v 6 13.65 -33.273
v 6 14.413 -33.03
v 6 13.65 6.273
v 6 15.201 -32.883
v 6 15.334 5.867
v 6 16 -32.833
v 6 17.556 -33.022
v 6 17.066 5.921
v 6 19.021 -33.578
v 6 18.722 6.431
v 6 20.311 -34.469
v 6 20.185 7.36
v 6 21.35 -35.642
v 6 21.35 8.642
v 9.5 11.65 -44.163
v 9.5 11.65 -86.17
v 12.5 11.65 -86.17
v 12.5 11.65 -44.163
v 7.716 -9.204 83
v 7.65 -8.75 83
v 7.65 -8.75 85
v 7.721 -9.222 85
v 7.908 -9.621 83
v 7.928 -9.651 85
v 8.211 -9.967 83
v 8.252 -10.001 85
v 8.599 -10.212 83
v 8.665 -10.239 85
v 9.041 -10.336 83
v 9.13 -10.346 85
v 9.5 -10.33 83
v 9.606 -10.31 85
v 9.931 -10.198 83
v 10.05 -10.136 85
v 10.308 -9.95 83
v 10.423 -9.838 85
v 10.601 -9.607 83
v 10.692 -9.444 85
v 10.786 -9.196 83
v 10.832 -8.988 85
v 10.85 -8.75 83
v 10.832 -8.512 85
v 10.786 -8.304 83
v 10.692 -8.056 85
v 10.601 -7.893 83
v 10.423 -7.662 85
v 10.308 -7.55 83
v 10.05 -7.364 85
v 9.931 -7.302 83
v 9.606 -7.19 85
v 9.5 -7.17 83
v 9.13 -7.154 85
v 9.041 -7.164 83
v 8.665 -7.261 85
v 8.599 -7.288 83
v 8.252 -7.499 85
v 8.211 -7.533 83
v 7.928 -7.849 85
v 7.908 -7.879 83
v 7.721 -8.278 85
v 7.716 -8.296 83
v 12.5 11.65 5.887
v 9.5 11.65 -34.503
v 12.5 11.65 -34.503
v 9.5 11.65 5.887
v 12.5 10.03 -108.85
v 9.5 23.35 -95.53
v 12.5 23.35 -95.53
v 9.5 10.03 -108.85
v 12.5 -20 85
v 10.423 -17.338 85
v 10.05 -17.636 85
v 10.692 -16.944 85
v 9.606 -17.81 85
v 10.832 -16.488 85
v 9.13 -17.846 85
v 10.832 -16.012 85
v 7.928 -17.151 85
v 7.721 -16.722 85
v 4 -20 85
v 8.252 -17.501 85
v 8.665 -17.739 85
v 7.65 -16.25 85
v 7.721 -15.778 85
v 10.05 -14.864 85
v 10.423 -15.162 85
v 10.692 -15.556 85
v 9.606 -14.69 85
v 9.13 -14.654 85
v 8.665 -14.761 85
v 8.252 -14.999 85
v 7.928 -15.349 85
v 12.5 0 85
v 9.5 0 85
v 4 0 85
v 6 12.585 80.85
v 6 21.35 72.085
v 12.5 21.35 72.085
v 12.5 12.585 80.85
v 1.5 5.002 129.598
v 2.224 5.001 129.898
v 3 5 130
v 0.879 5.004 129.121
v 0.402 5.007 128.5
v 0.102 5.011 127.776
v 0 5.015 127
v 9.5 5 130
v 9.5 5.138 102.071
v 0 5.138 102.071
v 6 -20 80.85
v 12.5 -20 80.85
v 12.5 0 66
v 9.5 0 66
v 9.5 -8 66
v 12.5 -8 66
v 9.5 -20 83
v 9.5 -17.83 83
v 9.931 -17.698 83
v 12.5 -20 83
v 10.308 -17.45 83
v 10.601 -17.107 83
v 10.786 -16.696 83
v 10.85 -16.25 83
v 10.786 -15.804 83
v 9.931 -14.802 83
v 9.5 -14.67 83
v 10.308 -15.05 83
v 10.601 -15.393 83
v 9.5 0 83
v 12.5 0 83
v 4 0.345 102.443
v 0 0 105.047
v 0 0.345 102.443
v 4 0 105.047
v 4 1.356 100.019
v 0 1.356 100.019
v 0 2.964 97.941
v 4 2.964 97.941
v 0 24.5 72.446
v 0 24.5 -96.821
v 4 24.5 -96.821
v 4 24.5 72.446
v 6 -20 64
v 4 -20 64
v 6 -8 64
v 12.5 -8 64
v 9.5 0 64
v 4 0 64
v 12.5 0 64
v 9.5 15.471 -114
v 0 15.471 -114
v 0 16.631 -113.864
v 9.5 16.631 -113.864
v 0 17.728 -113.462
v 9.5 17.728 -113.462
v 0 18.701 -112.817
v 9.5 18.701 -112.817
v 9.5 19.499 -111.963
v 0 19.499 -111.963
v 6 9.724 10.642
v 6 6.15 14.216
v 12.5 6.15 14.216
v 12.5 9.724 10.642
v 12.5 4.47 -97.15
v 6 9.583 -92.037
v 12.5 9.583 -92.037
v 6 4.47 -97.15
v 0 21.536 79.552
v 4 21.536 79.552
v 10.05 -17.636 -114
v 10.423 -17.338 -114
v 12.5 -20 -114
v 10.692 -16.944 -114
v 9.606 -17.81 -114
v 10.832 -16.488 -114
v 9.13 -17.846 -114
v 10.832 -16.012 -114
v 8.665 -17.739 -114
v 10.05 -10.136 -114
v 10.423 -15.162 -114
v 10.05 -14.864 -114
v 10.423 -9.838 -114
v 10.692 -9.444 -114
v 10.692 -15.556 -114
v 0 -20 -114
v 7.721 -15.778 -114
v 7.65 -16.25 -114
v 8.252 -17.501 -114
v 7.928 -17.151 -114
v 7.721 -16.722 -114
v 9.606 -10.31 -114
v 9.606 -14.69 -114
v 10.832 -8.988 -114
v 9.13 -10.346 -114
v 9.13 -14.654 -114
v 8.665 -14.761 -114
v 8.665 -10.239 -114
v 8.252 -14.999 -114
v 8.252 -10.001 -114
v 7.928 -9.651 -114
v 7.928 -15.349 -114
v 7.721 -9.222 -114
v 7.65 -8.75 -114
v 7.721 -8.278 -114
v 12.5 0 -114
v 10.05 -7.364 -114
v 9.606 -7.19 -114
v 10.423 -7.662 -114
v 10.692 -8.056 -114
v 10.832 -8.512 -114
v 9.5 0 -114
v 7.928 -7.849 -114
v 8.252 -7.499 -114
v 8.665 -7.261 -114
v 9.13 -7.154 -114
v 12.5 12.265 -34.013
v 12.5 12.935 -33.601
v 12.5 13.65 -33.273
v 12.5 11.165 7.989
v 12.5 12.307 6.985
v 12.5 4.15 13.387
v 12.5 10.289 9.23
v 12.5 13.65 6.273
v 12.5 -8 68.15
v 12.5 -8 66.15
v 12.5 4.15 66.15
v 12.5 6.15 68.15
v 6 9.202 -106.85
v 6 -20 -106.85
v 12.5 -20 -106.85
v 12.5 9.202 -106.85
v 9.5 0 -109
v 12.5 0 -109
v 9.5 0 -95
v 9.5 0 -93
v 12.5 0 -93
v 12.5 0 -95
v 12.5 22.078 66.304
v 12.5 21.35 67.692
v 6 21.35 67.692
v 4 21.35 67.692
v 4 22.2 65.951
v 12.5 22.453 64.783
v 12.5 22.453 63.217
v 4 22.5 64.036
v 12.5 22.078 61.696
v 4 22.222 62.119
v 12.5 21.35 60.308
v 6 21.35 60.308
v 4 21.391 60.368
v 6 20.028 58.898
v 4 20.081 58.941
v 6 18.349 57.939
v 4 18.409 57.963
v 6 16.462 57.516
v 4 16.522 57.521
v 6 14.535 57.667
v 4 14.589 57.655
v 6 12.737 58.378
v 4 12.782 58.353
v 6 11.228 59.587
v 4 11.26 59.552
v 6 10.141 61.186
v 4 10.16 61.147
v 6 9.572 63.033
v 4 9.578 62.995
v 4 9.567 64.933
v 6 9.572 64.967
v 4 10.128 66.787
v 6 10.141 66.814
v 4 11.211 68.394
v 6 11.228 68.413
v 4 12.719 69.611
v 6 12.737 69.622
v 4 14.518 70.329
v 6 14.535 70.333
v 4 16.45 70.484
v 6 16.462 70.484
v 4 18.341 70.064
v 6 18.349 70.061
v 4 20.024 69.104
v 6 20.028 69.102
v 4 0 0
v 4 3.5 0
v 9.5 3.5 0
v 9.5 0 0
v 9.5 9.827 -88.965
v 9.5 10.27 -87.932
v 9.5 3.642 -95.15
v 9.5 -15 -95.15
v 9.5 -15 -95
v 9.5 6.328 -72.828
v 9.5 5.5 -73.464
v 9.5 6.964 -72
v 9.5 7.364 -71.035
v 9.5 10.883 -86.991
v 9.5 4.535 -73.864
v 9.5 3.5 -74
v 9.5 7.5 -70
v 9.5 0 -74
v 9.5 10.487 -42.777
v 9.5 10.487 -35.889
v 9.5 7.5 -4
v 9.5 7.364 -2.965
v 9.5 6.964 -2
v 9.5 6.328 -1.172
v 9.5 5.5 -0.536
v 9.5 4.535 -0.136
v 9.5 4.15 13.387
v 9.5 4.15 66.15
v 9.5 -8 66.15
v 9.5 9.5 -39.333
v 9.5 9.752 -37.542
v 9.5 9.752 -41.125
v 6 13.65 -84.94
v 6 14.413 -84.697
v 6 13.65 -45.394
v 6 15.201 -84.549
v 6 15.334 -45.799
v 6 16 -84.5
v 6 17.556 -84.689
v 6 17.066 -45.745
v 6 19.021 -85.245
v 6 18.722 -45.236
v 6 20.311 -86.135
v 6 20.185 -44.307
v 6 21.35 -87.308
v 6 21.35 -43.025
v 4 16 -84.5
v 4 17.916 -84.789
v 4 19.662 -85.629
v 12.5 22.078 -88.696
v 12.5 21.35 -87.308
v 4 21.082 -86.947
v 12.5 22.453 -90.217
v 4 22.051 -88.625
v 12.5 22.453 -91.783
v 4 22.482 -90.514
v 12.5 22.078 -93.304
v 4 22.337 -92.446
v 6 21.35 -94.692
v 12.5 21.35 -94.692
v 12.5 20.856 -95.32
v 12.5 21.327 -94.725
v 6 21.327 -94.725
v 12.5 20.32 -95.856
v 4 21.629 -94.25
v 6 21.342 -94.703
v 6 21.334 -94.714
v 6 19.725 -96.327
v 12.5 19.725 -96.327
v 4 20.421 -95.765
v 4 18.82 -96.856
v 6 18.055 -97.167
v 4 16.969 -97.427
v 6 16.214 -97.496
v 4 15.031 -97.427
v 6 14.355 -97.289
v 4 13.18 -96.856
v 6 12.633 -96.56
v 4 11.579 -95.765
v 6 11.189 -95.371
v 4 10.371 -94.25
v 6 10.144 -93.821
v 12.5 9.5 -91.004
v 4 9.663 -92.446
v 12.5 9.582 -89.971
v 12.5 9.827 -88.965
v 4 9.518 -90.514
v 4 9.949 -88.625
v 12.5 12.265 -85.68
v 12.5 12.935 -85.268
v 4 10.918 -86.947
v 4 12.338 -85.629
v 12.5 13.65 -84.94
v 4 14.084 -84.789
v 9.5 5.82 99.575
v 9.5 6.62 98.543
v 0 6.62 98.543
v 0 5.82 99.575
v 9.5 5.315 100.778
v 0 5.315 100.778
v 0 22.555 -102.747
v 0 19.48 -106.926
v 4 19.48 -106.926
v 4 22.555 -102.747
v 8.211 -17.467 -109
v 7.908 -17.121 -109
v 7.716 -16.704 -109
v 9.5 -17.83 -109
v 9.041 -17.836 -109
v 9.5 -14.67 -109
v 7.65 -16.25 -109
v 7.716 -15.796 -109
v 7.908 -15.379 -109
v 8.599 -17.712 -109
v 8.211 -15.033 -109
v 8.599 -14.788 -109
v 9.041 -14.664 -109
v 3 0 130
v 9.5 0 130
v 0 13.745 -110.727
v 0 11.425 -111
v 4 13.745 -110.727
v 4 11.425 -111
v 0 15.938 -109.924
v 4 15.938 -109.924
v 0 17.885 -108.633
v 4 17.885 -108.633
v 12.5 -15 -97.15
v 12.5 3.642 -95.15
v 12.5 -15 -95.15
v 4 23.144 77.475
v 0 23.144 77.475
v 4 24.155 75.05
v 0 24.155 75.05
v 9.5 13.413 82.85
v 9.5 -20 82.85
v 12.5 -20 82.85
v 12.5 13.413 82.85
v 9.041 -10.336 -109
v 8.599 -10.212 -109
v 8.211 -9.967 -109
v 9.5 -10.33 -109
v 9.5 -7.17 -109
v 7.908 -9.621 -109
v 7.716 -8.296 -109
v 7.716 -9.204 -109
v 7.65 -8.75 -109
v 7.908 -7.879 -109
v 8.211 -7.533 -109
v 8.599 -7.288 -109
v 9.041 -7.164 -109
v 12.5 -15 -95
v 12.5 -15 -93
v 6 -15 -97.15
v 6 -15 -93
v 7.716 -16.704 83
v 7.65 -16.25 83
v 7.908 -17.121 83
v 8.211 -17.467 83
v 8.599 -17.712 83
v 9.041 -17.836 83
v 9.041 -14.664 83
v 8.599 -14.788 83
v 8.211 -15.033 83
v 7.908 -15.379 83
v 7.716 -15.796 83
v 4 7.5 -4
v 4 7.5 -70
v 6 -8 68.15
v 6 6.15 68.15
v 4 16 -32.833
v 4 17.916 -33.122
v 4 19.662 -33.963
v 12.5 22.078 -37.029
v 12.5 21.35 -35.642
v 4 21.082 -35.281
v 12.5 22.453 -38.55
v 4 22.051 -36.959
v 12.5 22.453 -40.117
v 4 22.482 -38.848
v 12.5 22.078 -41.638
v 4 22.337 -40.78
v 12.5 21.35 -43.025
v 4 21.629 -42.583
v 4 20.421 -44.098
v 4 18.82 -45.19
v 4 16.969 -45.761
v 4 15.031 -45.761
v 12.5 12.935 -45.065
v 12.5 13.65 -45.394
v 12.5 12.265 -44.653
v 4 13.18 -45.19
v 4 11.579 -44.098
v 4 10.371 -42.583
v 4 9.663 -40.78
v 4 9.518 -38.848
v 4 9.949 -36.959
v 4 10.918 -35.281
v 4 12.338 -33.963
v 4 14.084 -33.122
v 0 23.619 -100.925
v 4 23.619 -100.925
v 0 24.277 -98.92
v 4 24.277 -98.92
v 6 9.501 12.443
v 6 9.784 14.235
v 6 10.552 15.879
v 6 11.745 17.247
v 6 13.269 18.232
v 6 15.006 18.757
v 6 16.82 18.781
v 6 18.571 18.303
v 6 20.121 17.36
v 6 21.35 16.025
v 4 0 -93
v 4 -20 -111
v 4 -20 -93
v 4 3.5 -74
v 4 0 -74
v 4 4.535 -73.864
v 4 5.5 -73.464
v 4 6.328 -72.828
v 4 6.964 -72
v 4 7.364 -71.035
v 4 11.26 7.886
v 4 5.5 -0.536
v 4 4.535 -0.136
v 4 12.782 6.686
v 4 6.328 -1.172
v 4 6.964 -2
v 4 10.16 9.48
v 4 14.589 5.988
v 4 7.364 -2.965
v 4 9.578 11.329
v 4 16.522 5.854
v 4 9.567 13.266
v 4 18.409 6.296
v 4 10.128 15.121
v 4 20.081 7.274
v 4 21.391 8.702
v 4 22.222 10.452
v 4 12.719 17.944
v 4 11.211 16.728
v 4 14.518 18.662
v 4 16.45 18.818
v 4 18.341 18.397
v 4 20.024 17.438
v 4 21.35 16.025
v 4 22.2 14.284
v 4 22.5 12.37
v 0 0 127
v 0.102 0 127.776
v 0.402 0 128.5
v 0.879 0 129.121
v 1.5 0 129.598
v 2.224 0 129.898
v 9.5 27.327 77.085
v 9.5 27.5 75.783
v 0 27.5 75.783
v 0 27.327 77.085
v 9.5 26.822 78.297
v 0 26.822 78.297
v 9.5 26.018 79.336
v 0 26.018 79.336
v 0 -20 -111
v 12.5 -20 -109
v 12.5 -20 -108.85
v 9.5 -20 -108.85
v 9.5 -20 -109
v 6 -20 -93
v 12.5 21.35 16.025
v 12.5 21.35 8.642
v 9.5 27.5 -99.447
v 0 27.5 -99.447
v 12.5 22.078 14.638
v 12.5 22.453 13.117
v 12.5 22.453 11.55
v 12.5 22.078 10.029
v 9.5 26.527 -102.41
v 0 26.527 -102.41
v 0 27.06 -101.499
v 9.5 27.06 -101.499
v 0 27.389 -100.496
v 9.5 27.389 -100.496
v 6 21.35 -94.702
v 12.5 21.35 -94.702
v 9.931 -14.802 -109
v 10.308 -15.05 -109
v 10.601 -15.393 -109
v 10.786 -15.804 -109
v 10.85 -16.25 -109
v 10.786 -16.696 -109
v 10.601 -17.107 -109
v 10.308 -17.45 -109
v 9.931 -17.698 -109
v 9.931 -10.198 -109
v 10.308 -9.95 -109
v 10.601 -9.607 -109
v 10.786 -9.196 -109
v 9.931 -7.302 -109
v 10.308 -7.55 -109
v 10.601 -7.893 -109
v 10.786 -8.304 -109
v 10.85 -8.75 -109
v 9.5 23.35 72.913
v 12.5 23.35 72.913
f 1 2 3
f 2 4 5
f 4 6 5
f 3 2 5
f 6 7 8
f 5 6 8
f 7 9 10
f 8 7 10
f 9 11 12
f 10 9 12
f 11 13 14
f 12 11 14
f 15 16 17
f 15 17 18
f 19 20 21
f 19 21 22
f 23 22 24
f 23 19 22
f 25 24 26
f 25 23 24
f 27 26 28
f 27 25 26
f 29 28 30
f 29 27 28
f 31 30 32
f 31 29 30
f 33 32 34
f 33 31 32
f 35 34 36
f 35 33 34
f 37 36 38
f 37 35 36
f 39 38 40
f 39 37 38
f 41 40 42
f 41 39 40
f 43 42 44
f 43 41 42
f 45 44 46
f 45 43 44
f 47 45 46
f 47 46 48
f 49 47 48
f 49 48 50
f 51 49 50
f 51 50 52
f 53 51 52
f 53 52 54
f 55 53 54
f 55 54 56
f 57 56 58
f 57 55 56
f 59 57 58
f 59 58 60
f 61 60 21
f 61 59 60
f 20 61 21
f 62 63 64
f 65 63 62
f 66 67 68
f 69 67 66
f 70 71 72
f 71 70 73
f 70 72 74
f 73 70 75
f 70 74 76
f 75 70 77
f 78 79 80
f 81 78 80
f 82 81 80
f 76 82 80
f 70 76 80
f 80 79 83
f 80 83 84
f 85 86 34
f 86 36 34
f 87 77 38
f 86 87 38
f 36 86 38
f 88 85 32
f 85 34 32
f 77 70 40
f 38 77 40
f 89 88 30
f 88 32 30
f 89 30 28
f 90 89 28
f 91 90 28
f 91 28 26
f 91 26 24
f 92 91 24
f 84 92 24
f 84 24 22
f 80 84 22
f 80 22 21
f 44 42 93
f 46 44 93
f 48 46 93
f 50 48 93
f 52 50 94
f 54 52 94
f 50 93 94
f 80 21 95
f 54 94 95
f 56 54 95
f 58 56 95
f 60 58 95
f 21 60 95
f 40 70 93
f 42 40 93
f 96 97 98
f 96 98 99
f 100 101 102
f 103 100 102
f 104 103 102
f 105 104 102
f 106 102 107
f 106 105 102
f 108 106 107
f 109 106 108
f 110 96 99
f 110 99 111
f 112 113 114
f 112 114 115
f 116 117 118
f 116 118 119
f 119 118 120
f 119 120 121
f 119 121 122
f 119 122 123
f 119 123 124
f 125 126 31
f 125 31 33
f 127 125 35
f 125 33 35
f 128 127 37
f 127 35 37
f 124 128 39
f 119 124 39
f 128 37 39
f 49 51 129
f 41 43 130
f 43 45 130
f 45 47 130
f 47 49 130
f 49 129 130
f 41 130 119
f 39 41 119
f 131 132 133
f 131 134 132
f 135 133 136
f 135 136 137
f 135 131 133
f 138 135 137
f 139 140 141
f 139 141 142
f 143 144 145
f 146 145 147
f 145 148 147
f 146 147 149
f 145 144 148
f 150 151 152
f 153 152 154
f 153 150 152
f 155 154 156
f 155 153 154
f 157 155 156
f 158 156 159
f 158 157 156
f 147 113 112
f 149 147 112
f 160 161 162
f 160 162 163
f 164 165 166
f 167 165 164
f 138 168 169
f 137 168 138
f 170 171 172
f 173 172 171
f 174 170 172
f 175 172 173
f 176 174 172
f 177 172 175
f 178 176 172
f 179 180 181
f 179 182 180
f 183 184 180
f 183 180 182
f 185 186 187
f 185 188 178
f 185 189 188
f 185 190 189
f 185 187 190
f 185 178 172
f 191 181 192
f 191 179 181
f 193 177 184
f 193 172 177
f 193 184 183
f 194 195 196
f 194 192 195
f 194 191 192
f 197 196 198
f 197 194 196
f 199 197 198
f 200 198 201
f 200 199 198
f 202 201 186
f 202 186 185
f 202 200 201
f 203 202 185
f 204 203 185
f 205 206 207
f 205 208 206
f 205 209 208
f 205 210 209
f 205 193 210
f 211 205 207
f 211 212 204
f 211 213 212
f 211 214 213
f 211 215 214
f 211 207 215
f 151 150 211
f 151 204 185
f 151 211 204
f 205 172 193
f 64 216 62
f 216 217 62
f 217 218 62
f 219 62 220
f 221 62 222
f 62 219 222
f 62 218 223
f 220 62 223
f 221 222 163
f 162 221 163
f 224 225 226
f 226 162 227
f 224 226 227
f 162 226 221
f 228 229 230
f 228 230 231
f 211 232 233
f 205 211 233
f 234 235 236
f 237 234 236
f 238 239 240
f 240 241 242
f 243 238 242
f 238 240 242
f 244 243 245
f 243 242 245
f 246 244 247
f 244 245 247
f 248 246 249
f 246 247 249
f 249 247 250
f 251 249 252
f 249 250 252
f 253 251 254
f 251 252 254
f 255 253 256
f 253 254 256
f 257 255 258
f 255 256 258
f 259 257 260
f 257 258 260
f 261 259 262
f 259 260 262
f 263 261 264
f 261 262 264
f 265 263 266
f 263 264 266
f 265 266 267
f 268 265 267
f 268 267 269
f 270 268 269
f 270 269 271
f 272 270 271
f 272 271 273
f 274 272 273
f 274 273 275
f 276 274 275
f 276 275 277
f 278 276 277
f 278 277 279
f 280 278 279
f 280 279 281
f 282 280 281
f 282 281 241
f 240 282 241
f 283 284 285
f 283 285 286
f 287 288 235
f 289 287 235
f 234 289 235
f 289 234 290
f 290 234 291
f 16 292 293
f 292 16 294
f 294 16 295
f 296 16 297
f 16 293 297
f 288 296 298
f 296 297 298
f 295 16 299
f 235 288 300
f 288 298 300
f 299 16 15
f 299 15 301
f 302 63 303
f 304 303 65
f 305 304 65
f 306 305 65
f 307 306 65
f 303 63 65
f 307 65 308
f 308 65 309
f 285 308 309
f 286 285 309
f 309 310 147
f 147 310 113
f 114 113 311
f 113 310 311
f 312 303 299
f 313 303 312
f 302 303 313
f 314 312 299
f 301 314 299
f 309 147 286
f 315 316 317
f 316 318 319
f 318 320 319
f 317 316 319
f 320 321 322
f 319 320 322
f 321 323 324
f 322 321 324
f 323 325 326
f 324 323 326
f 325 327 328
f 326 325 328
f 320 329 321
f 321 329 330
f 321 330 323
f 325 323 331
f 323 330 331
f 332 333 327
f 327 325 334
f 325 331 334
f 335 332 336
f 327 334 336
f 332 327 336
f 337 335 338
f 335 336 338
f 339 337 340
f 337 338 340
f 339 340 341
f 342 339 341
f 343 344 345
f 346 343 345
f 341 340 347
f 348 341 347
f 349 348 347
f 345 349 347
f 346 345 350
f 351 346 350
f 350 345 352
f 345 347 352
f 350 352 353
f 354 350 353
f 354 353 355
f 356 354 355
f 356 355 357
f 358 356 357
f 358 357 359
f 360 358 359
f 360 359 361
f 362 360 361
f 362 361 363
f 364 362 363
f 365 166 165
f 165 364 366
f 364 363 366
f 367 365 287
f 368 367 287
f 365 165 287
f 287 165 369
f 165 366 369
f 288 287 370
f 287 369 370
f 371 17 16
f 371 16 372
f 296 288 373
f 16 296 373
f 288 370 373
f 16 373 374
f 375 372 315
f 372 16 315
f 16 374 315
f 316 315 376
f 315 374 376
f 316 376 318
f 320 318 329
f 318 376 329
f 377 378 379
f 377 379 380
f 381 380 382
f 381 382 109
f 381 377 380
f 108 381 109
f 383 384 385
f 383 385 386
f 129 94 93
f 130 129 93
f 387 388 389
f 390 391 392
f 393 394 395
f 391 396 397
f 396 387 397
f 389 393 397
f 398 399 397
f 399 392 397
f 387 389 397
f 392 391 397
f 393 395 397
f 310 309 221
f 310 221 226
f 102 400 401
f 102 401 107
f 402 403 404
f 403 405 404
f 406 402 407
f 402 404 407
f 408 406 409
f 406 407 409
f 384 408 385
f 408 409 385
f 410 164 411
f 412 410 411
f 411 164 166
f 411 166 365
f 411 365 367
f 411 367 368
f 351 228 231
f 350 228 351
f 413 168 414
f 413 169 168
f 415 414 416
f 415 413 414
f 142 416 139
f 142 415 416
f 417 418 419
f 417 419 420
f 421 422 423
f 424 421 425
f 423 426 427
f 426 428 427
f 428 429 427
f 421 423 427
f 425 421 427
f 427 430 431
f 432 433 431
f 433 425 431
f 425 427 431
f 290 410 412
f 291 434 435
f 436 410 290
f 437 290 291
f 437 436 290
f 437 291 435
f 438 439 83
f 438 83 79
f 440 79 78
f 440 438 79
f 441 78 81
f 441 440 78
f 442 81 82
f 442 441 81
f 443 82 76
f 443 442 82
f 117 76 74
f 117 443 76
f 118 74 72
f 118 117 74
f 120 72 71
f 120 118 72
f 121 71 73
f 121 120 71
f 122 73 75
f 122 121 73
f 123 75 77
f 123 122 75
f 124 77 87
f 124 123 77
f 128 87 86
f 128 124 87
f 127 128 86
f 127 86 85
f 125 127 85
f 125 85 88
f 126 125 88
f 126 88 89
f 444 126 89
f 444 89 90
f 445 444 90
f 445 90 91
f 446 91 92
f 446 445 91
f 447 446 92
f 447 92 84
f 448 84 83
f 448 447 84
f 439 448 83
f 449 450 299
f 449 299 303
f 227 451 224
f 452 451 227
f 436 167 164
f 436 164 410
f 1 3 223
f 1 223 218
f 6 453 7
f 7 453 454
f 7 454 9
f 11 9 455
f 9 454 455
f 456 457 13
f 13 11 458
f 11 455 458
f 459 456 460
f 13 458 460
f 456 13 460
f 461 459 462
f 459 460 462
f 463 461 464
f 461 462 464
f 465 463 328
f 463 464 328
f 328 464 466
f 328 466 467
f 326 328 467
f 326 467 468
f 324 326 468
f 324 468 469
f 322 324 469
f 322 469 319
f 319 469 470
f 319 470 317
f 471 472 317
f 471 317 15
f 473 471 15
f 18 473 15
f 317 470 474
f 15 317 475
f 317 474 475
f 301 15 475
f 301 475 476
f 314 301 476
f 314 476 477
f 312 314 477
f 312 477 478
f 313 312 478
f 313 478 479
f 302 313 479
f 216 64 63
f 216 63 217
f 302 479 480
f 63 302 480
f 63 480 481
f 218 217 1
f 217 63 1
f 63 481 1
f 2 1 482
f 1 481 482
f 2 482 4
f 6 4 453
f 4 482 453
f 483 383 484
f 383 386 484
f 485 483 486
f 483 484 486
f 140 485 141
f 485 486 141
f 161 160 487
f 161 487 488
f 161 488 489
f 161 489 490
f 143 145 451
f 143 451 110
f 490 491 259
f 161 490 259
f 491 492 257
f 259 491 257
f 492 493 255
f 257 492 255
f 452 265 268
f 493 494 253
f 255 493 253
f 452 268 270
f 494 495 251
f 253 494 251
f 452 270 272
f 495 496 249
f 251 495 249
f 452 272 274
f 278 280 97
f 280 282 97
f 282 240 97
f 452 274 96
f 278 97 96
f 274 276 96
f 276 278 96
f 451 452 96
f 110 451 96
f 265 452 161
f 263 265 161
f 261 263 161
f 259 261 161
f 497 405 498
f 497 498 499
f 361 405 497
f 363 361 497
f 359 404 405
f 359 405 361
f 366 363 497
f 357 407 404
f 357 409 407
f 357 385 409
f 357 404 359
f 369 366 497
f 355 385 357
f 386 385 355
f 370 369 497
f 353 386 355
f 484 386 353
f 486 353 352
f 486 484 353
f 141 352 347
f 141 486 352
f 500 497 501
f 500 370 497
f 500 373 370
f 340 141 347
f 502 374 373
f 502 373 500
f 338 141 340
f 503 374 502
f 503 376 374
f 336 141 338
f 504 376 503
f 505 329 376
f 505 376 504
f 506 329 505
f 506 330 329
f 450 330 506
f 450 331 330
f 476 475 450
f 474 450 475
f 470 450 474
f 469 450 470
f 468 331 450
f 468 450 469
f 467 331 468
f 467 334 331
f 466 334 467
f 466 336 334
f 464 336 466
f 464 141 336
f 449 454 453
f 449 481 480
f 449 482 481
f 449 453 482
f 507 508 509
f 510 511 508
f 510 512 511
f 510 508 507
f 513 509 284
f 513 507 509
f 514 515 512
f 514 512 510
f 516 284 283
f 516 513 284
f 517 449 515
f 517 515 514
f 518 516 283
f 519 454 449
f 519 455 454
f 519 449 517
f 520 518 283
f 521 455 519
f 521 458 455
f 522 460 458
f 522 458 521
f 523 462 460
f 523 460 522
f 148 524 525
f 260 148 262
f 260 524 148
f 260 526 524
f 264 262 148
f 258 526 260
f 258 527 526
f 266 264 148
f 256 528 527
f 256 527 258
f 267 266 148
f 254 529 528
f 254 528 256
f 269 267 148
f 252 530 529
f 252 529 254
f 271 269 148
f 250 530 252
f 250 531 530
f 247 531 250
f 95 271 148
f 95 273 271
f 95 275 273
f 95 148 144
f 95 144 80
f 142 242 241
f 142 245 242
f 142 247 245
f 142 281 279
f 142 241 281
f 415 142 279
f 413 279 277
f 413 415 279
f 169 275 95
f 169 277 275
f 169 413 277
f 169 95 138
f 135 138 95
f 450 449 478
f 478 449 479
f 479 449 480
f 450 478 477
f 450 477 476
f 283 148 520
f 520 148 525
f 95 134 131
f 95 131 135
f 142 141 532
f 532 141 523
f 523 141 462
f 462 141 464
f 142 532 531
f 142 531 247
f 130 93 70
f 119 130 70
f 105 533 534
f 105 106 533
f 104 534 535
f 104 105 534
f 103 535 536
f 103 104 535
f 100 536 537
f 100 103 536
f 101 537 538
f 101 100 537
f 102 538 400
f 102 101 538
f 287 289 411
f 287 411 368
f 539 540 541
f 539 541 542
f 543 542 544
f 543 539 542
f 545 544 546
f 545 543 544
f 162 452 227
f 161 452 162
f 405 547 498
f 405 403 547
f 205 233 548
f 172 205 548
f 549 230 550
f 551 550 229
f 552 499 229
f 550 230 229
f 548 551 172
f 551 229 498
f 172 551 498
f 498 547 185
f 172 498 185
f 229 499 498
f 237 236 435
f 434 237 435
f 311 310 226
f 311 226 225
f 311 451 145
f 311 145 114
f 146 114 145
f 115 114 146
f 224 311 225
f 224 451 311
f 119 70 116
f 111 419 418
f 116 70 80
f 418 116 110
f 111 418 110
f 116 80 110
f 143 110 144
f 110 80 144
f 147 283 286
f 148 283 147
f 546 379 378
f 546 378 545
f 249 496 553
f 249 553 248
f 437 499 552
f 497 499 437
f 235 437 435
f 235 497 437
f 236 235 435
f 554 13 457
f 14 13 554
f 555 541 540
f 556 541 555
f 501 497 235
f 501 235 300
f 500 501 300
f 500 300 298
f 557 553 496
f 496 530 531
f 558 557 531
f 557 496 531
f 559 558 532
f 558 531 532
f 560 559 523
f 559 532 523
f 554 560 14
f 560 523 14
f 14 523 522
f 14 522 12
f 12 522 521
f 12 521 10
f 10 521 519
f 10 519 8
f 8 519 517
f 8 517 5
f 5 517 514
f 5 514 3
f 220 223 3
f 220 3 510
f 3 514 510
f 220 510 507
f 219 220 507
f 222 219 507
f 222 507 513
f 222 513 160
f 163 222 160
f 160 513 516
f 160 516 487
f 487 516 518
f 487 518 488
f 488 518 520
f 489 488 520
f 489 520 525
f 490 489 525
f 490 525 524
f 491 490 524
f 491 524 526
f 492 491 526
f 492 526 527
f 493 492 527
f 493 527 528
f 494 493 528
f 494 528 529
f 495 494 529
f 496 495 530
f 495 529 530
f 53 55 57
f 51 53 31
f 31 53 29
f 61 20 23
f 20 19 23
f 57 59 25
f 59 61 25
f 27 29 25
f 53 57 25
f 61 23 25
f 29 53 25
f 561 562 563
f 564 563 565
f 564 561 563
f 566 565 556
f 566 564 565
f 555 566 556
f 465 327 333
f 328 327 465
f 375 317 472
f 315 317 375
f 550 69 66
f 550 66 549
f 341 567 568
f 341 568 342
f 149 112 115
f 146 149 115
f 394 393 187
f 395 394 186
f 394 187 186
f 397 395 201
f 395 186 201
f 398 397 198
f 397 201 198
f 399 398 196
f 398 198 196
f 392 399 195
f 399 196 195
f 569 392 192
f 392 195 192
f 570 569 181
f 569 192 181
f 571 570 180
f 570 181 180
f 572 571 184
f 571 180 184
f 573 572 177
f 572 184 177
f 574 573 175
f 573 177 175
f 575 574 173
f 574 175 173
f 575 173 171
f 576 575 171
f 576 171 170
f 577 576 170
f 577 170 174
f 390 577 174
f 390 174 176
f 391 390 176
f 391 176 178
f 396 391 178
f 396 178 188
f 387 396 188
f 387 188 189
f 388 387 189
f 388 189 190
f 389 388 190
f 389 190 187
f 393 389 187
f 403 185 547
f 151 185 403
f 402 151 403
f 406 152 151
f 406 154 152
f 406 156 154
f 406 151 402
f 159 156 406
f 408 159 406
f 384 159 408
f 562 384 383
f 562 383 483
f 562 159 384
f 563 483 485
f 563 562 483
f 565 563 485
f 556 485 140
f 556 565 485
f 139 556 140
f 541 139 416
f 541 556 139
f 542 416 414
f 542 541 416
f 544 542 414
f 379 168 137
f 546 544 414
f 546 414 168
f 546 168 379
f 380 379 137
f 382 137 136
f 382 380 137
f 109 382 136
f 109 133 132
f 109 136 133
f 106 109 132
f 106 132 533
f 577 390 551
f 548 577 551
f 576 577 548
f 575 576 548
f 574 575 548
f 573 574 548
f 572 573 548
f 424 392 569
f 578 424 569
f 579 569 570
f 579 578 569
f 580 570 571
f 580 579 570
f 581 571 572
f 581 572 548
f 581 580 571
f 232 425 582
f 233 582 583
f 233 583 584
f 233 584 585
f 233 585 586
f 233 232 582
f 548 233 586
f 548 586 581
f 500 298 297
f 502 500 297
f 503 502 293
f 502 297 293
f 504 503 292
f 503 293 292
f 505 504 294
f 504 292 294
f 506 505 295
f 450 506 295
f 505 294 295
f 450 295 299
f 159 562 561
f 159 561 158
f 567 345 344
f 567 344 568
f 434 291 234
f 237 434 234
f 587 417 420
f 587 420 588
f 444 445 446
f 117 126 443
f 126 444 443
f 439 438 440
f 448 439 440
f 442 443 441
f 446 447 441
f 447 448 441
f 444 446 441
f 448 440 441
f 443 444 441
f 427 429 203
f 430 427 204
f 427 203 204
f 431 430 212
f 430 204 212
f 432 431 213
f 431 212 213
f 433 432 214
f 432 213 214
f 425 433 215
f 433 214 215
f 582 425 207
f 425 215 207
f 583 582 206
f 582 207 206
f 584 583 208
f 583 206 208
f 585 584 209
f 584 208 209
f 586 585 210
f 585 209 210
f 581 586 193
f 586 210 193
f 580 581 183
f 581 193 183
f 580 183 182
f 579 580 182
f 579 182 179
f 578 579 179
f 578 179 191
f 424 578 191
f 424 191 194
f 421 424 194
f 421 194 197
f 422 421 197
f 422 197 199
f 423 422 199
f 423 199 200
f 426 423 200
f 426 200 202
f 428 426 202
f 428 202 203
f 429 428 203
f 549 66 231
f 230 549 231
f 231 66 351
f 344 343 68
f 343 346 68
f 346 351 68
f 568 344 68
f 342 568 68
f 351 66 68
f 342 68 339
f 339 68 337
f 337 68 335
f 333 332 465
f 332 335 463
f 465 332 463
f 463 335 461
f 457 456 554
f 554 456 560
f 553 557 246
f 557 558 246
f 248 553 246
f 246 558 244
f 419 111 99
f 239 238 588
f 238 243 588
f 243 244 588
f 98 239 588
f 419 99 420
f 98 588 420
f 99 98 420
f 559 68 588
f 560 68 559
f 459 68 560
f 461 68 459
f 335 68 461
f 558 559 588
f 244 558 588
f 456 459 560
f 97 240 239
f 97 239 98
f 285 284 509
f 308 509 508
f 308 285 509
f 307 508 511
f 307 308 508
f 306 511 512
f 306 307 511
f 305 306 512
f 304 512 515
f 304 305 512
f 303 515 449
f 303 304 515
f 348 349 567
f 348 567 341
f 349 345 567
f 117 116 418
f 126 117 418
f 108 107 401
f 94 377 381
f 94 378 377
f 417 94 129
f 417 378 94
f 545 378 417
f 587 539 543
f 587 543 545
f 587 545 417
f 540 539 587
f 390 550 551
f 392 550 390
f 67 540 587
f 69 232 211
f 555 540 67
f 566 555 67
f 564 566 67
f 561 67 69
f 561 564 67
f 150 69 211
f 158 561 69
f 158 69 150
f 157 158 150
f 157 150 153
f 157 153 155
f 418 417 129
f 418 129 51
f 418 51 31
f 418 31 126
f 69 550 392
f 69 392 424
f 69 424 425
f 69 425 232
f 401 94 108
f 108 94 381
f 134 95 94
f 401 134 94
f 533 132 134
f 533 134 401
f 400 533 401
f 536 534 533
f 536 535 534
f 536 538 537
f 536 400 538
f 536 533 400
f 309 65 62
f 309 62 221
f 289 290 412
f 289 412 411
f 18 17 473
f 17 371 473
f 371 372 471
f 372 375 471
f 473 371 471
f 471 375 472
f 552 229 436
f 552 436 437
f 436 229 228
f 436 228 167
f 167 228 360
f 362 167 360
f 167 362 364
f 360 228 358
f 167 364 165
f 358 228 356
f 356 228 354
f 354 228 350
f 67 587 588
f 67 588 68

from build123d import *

# Parameters (mm, degrees)
BOSS_EXTRUDE1_DEPTH          = 25
CUT_EXTRUDE1_DEPTH           = 4
FILLET1_R                    = 4
FILLET2_R                    = 10
FILLET3_R                    = 5
FILLET4_R                    = 3
BOSS_EXTRUDE2_DEPTH          = 3
BOSS_EXTRUDE2_DEPTH_BACK     = 3
FILLET5_R                    = 3
SKETCH6_W                    = 13
SKETCH6_H                    = 14
BOSS_EXTRUDE3_DEPTH          = 20
BOSS_EXTRUDE4_DEPTH          = 20
SKETCH9_W                    = 13
SKETCH9_H                    = 2
BOSS_EXTRUDE5_DEPTH          = 8
SKETCH7_W                    = 13
SKETCH7_H                    = 2
CUT_EXTRUDE2_DEPTH           = 5
SKETCH11_R                   = 1.6
CUT_EXTRUDE3_DEPTH           = 19
CUT_EXTRUDE4_START           = -2
SKETCH12_R                   = 1.6
CUT_EXTRUDE4_DEPTH           = 2
CUT_EXTRUDE5_DEPTH           = 6.5
CUT_EXTRUDE5_DEPTH_BACK      = 6.5
CUT_EXTRUDE7_DEPTH           = 247.814201374
BOSS_EXTRUDE6_DEPTH          = 6.5
BOSS_EXTRUDE8_DEPTH          = 3.5
MAKE_THIS_A_SQUARE_OR_SMTH_R = 6.5
CUT_EXTRUDE8_DEPTH           = 134.148413434


with BuildPart() as part:
    # Sketch1 → Boss-Extrude1 (new body)
    with BuildSketch(Plane(origin=(0, 0, 0), x_dir=(0, 0, -1), z_dir=(1, 0, 0))):
        Polygon((0, 0), (-130, 0), (-130, 5), (-100.000366453, 5.148280317), (-77.868517379, 27.5), (101.088229162, 27.5), (114, 18), (114, 0), (74, 0), (74, 7.5), (0, 7.5), align=None)
    extrude(amount=BOSS_EXTRUDE1_DEPTH)

    # Sketch4 → Cut-Extrude1 (cut)
    with BuildSketch(Plane(origin=(25, 0, 0), x_dir=(0, 0, -1), z_dir=(1, 0, 0))):
        Polygon((-100.876178749, 0), (0, 0), (111, 0), (111, 3), (111, 16.482758557), (100.103496394, 24.5), (-76.617181678, 24.5), align=None)
    cut_extrude1 = extrude(amount=-CUT_EXTRUDE1_DEPTH, mode=Mode.SUBTRACT)

    # Mirror2: Cut-Extrude1 across plane
    add(cut_extrude1.mirror(Plane(origin=(12.5, 0, 0), x_dir=(0, 0, 1), z_dir=(1, 0, 0))), mode=Mode.SUBTRACT)

    # Fillet1
    fillet1_edges = [part.edges().sort_by_distance(p)[0] for p in [
        (12.5, 7.5, -74),
        (12.5, 7.5, 0),
    ]]
    fillet(fillet1_edges, radius=FILLET1_R)

    # Fillet2
    fillet2_edges = [part.edges().sort_by_distance(p)[0] for p in [
        (23, 0, 100.876178749),
        (23, 24.5, 76.617181678),
        (23, 24.5, -100.103496394),
        (23, 16.482758557, -111),
        (2, 0, 100.876178749),
        (2, 16.482758557, -111),
        (2, 24.5, -100.103496394),
        (2, 24.5, 76.617181678),
    ]]
    fillet(fillet2_edges, radius=FILLET2_R)

    # Fillet3
    fillet3_edges = [part.edges().sort_by_distance(p)[0] for p in [
        (12.5, 5.148280317, 100.000366453),
        (12.5, 27.5, 77.868517379),
        (12.5, 27.5, -101.088229162),
        (12.5, 18, -114),
    ]]
    fillet(fillet3_edges, radius=FILLET3_R)

    # Fillet4
    fillet4_edges = [part.edges().sort_by_distance(p)[0] for p in [
        (0, 2.5, 130),
        (25, 2.5, 130),
    ]]
    fillet(fillet4_edges, radius=FILLET4_R)

    # Sketch5 → Boss-Extrude2 (add, two sides: drawn at the far end of the back side and taken through both)
    with BuildSketch(Plane(origin=(12.5, 0, 0), x_dir=(0, 0, -1), z_dir=(1, 0, 0)).offset(-BOSS_EXTRUDE2_DEPTH_BACK)):
        Polygon((-117.8659777, 5.059975288), (-103.793914836, 19.271838176), (-72.605250228, 19.271838176), (-95.8659777, 5.059975288), align=None)
    extrude(amount=BOSS_EXTRUDE2_DEPTH + BOSS_EXTRUDE2_DEPTH_BACK)

    # Fillet5
    fillet5_edges = [part.edges().sort_by_distance(p)[0] for p in [
        (12.5, 19.271838176, 103.793914836),
    ]]
    fillet(fillet5_edges, radius=FILLET5_R)

    # Sketch6 → Boss-Extrude3 (add)
    with BuildSketch(Plane.XZ):
        Polygon((0, -111), (4, -111), (4, -93), (21, -93), (21, -111), (25, -111), (25, -114), (0, -114), align=None)
        with Locations((12.5, -102)):
            Rectangle(SKETCH6_W, SKETCH6_H, mode=Mode.SUBTRACT)
    extrude(amount=BOSS_EXTRUDE3_DEPTH)

    # Sketch8 → Boss-Extrude4 (add)
    with BuildSketch(Plane.XZ):
        Polygon((21, 85), (4, 85), (4, 64), (6, 64), (6, 83), (19, 83), (19, 64), (21, 64), align=None)
    extrude(amount=BOSS_EXTRUDE4_DEPTH)

    # Sketch9 → Boss-Extrude5 (add)
    with BuildSketch(Plane.XZ):
        with Locations((12.5, 65)):
            Rectangle(SKETCH9_W, SKETCH9_H)
    extrude(amount=BOSS_EXTRUDE5_DEPTH)

    # Sketch7 → Cut-Extrude2 (cut)
    with BuildSketch(Plane.XZ.offset(20)):
        with Locations((12.5, -94)):
            Rectangle(SKETCH7_W, SKETCH7_H)
    extrude(amount=-CUT_EXTRUDE2_DEPTH, mode=Mode.SUBTRACT)

    # Sketch11 → Cut-Extrude3 (cut)
    with BuildSketch(Plane(origin=(0, 0, -114), x_dir=(-1, 0, 0), z_dir=(0, 0, -1))):
        with Locations((-15.75, -16.25)):
            Circle(SKETCH11_R)
        with Locations((-15.75, -8.75)):
            Circle(SKETCH11_R)
        with Locations((-9.25, -8.75)):
            Circle(SKETCH11_R)
        with Locations((-9.25, -16.25)):
            Circle(SKETCH11_R)
    extrude(amount=-CUT_EXTRUDE3_DEPTH, mode=Mode.SUBTRACT)

    # Sketch12 → Cut-Extrude4 (cut)
    with BuildSketch(Plane.XY.offset(85).offset(CUT_EXTRUDE4_START)):
        with Locations(Location((15.75, -16.25, 0), (0, 0, 180))):
            Circle(SKETCH12_R)
        with Locations(Location((9.25, -16.25, 0), (0, 0, 180))):
            Circle(SKETCH12_R)
        with Locations(Location((9.25, -8.75, 0), (0, 0, 180))):
            Circle(SKETCH12_R)
        with Locations(Location((15.75, -8.75, 0), (0, 0, 180))):
            Circle(SKETCH12_R)
    extrude(amount=CUT_EXTRUDE4_DEPTH, mode=Mode.SUBTRACT)

    # Sketch14 → Cut-Extrude5 (cut, two sides: drawn at the far end of the back side and taken through both)
    with BuildSketch(Plane(origin=(12.5, 0, 0), x_dir=(0, 0, -1), z_dir=(1, 0, 0)).offset(-CUT_EXTRUDE5_DEPTH_BACK)):
        Polygon((-83, 0), (-83, 13.475167258), (-72.975167258, 23.5), (95.592427597, 23.5), (109, 10.092427597), (109, 0), (95, 0), (95, 3.57939317), (87.07939317, 11.5), (-5.825100808, 11.5), (-13.325100808, 4), (-66, 4), (-66, 0), align=None)
    extrude(amount=CUT_EXTRUDE5_DEPTH + CUT_EXTRUDE5_DEPTH_BACK, mode=Mode.SUBTRACT)

    # Sketch17 → Cut-Extrude7 (cut, through all)
    with BuildSketch(Plane.XY.offset(130)):
        Polygon((12.5, -20), (25, -20), (25, 27.5), (9.5, 27.5), (9.5, 5.138043697), (9.5, 0), (12.5, 0), align=None)
    extrude(amount=-CUT_EXTRUDE7_DEPTH, mode=Mode.SUBTRACT)

    # Sketch18 → Boss-Extrude6 (add)
    with BuildSketch(Plane(origin=(6, 0, 0), x_dir=(0, 0, -1), z_dir=(1, 0, 0))):
        Polygon((-66.15, -8), (-68.15, -8), (-68.15, 6.15), (-14.215659968, 6.15), (-6.715659968, 13.65), (87.96995233, 13.65), (97.15, 4.46995233), (97.15, -15), (95.15, -15), (95.15, 3.641525205), (87.141525205, 11.65), (-5.887232843, 11.65), (-13.387232843, 4.15), (-66.15, 4.15), align=None)
        Polygon((-82.85, -20), (-82.85, 13.413035223), (-72.913035223, 23.35), (95.530295563, 23.35), (108.85, 10.030295563), (108.85, -20), (106.85, -20), (106.85, 9.201868438), (94.701868438, 21.35), (-72.084608099, 21.35), (-80.85, 12.584608099), (-80.85, -20), align=None)
    extrude(amount=BOSS_EXTRUDE6_DEPTH)

    # Sketch24 → Boss-Extrude8 (add)
    with BuildSketch(Plane(origin=(6, 0, 0), x_dir=(0, 0, -1), z_dir=(1, 0, 0))):
        Polygon((-83, -20), (-82.85, -20), (-82.85, 13.413035223), (-72.913035223, 23.35), (95.530295563, 23.35), (108.85, 10.030295563), (108.85, -20), (109, -20), (109, 10.092427597), (95.592427597, 23.5), (-72.975167258, 23.5), (-83, 13.475167258), align=None)
        Polygon((-66.15, -8), (-66, -8), (-66, 4), (-13.325100808, 4), (-5.825100808, 11.5), (87.07939317, 11.5), (95, 3.57939317), (95, -15), (95.15, -15), (95.15, 3.641525205), (87.141525205, 11.65), (-5.887232843, 11.65), (-13.387232843, 4.15), (-66.15, 4.15), align=None)
    extrude(amount=BOSS_EXTRUDE8_DEPTH)

    # MAKE THIS A SQUARE OR SMTH → Cut-Extrude8 (cut, through all)
    with BuildSketch(Plane.ZY.offset(-4)):
        with Locations((-91, 16)):
            Circle(MAKE_THIS_A_SQUARE_OR_SMTH_R)
        with Locations((-39.333333333, 16)):
            Circle(MAKE_THIS_A_SQUARE_OR_SMTH_R)
        with Locations(Location((64, 16, 0), (0, 0, 55.394002372))):
            Circle(MAKE_THIS_A_SQUARE_OR_SMTH_R)
        with Locations(Location((12.333333333, 16, 0), (0, 0, 55.394002372))):
            Circle(MAKE_THIS_A_SQUARE_OR_SMTH_R)
    extrude(amount=-CUT_EXTRUDE8_DEPTH, mode=Mode.SUBTRACT)


solid = part.part
